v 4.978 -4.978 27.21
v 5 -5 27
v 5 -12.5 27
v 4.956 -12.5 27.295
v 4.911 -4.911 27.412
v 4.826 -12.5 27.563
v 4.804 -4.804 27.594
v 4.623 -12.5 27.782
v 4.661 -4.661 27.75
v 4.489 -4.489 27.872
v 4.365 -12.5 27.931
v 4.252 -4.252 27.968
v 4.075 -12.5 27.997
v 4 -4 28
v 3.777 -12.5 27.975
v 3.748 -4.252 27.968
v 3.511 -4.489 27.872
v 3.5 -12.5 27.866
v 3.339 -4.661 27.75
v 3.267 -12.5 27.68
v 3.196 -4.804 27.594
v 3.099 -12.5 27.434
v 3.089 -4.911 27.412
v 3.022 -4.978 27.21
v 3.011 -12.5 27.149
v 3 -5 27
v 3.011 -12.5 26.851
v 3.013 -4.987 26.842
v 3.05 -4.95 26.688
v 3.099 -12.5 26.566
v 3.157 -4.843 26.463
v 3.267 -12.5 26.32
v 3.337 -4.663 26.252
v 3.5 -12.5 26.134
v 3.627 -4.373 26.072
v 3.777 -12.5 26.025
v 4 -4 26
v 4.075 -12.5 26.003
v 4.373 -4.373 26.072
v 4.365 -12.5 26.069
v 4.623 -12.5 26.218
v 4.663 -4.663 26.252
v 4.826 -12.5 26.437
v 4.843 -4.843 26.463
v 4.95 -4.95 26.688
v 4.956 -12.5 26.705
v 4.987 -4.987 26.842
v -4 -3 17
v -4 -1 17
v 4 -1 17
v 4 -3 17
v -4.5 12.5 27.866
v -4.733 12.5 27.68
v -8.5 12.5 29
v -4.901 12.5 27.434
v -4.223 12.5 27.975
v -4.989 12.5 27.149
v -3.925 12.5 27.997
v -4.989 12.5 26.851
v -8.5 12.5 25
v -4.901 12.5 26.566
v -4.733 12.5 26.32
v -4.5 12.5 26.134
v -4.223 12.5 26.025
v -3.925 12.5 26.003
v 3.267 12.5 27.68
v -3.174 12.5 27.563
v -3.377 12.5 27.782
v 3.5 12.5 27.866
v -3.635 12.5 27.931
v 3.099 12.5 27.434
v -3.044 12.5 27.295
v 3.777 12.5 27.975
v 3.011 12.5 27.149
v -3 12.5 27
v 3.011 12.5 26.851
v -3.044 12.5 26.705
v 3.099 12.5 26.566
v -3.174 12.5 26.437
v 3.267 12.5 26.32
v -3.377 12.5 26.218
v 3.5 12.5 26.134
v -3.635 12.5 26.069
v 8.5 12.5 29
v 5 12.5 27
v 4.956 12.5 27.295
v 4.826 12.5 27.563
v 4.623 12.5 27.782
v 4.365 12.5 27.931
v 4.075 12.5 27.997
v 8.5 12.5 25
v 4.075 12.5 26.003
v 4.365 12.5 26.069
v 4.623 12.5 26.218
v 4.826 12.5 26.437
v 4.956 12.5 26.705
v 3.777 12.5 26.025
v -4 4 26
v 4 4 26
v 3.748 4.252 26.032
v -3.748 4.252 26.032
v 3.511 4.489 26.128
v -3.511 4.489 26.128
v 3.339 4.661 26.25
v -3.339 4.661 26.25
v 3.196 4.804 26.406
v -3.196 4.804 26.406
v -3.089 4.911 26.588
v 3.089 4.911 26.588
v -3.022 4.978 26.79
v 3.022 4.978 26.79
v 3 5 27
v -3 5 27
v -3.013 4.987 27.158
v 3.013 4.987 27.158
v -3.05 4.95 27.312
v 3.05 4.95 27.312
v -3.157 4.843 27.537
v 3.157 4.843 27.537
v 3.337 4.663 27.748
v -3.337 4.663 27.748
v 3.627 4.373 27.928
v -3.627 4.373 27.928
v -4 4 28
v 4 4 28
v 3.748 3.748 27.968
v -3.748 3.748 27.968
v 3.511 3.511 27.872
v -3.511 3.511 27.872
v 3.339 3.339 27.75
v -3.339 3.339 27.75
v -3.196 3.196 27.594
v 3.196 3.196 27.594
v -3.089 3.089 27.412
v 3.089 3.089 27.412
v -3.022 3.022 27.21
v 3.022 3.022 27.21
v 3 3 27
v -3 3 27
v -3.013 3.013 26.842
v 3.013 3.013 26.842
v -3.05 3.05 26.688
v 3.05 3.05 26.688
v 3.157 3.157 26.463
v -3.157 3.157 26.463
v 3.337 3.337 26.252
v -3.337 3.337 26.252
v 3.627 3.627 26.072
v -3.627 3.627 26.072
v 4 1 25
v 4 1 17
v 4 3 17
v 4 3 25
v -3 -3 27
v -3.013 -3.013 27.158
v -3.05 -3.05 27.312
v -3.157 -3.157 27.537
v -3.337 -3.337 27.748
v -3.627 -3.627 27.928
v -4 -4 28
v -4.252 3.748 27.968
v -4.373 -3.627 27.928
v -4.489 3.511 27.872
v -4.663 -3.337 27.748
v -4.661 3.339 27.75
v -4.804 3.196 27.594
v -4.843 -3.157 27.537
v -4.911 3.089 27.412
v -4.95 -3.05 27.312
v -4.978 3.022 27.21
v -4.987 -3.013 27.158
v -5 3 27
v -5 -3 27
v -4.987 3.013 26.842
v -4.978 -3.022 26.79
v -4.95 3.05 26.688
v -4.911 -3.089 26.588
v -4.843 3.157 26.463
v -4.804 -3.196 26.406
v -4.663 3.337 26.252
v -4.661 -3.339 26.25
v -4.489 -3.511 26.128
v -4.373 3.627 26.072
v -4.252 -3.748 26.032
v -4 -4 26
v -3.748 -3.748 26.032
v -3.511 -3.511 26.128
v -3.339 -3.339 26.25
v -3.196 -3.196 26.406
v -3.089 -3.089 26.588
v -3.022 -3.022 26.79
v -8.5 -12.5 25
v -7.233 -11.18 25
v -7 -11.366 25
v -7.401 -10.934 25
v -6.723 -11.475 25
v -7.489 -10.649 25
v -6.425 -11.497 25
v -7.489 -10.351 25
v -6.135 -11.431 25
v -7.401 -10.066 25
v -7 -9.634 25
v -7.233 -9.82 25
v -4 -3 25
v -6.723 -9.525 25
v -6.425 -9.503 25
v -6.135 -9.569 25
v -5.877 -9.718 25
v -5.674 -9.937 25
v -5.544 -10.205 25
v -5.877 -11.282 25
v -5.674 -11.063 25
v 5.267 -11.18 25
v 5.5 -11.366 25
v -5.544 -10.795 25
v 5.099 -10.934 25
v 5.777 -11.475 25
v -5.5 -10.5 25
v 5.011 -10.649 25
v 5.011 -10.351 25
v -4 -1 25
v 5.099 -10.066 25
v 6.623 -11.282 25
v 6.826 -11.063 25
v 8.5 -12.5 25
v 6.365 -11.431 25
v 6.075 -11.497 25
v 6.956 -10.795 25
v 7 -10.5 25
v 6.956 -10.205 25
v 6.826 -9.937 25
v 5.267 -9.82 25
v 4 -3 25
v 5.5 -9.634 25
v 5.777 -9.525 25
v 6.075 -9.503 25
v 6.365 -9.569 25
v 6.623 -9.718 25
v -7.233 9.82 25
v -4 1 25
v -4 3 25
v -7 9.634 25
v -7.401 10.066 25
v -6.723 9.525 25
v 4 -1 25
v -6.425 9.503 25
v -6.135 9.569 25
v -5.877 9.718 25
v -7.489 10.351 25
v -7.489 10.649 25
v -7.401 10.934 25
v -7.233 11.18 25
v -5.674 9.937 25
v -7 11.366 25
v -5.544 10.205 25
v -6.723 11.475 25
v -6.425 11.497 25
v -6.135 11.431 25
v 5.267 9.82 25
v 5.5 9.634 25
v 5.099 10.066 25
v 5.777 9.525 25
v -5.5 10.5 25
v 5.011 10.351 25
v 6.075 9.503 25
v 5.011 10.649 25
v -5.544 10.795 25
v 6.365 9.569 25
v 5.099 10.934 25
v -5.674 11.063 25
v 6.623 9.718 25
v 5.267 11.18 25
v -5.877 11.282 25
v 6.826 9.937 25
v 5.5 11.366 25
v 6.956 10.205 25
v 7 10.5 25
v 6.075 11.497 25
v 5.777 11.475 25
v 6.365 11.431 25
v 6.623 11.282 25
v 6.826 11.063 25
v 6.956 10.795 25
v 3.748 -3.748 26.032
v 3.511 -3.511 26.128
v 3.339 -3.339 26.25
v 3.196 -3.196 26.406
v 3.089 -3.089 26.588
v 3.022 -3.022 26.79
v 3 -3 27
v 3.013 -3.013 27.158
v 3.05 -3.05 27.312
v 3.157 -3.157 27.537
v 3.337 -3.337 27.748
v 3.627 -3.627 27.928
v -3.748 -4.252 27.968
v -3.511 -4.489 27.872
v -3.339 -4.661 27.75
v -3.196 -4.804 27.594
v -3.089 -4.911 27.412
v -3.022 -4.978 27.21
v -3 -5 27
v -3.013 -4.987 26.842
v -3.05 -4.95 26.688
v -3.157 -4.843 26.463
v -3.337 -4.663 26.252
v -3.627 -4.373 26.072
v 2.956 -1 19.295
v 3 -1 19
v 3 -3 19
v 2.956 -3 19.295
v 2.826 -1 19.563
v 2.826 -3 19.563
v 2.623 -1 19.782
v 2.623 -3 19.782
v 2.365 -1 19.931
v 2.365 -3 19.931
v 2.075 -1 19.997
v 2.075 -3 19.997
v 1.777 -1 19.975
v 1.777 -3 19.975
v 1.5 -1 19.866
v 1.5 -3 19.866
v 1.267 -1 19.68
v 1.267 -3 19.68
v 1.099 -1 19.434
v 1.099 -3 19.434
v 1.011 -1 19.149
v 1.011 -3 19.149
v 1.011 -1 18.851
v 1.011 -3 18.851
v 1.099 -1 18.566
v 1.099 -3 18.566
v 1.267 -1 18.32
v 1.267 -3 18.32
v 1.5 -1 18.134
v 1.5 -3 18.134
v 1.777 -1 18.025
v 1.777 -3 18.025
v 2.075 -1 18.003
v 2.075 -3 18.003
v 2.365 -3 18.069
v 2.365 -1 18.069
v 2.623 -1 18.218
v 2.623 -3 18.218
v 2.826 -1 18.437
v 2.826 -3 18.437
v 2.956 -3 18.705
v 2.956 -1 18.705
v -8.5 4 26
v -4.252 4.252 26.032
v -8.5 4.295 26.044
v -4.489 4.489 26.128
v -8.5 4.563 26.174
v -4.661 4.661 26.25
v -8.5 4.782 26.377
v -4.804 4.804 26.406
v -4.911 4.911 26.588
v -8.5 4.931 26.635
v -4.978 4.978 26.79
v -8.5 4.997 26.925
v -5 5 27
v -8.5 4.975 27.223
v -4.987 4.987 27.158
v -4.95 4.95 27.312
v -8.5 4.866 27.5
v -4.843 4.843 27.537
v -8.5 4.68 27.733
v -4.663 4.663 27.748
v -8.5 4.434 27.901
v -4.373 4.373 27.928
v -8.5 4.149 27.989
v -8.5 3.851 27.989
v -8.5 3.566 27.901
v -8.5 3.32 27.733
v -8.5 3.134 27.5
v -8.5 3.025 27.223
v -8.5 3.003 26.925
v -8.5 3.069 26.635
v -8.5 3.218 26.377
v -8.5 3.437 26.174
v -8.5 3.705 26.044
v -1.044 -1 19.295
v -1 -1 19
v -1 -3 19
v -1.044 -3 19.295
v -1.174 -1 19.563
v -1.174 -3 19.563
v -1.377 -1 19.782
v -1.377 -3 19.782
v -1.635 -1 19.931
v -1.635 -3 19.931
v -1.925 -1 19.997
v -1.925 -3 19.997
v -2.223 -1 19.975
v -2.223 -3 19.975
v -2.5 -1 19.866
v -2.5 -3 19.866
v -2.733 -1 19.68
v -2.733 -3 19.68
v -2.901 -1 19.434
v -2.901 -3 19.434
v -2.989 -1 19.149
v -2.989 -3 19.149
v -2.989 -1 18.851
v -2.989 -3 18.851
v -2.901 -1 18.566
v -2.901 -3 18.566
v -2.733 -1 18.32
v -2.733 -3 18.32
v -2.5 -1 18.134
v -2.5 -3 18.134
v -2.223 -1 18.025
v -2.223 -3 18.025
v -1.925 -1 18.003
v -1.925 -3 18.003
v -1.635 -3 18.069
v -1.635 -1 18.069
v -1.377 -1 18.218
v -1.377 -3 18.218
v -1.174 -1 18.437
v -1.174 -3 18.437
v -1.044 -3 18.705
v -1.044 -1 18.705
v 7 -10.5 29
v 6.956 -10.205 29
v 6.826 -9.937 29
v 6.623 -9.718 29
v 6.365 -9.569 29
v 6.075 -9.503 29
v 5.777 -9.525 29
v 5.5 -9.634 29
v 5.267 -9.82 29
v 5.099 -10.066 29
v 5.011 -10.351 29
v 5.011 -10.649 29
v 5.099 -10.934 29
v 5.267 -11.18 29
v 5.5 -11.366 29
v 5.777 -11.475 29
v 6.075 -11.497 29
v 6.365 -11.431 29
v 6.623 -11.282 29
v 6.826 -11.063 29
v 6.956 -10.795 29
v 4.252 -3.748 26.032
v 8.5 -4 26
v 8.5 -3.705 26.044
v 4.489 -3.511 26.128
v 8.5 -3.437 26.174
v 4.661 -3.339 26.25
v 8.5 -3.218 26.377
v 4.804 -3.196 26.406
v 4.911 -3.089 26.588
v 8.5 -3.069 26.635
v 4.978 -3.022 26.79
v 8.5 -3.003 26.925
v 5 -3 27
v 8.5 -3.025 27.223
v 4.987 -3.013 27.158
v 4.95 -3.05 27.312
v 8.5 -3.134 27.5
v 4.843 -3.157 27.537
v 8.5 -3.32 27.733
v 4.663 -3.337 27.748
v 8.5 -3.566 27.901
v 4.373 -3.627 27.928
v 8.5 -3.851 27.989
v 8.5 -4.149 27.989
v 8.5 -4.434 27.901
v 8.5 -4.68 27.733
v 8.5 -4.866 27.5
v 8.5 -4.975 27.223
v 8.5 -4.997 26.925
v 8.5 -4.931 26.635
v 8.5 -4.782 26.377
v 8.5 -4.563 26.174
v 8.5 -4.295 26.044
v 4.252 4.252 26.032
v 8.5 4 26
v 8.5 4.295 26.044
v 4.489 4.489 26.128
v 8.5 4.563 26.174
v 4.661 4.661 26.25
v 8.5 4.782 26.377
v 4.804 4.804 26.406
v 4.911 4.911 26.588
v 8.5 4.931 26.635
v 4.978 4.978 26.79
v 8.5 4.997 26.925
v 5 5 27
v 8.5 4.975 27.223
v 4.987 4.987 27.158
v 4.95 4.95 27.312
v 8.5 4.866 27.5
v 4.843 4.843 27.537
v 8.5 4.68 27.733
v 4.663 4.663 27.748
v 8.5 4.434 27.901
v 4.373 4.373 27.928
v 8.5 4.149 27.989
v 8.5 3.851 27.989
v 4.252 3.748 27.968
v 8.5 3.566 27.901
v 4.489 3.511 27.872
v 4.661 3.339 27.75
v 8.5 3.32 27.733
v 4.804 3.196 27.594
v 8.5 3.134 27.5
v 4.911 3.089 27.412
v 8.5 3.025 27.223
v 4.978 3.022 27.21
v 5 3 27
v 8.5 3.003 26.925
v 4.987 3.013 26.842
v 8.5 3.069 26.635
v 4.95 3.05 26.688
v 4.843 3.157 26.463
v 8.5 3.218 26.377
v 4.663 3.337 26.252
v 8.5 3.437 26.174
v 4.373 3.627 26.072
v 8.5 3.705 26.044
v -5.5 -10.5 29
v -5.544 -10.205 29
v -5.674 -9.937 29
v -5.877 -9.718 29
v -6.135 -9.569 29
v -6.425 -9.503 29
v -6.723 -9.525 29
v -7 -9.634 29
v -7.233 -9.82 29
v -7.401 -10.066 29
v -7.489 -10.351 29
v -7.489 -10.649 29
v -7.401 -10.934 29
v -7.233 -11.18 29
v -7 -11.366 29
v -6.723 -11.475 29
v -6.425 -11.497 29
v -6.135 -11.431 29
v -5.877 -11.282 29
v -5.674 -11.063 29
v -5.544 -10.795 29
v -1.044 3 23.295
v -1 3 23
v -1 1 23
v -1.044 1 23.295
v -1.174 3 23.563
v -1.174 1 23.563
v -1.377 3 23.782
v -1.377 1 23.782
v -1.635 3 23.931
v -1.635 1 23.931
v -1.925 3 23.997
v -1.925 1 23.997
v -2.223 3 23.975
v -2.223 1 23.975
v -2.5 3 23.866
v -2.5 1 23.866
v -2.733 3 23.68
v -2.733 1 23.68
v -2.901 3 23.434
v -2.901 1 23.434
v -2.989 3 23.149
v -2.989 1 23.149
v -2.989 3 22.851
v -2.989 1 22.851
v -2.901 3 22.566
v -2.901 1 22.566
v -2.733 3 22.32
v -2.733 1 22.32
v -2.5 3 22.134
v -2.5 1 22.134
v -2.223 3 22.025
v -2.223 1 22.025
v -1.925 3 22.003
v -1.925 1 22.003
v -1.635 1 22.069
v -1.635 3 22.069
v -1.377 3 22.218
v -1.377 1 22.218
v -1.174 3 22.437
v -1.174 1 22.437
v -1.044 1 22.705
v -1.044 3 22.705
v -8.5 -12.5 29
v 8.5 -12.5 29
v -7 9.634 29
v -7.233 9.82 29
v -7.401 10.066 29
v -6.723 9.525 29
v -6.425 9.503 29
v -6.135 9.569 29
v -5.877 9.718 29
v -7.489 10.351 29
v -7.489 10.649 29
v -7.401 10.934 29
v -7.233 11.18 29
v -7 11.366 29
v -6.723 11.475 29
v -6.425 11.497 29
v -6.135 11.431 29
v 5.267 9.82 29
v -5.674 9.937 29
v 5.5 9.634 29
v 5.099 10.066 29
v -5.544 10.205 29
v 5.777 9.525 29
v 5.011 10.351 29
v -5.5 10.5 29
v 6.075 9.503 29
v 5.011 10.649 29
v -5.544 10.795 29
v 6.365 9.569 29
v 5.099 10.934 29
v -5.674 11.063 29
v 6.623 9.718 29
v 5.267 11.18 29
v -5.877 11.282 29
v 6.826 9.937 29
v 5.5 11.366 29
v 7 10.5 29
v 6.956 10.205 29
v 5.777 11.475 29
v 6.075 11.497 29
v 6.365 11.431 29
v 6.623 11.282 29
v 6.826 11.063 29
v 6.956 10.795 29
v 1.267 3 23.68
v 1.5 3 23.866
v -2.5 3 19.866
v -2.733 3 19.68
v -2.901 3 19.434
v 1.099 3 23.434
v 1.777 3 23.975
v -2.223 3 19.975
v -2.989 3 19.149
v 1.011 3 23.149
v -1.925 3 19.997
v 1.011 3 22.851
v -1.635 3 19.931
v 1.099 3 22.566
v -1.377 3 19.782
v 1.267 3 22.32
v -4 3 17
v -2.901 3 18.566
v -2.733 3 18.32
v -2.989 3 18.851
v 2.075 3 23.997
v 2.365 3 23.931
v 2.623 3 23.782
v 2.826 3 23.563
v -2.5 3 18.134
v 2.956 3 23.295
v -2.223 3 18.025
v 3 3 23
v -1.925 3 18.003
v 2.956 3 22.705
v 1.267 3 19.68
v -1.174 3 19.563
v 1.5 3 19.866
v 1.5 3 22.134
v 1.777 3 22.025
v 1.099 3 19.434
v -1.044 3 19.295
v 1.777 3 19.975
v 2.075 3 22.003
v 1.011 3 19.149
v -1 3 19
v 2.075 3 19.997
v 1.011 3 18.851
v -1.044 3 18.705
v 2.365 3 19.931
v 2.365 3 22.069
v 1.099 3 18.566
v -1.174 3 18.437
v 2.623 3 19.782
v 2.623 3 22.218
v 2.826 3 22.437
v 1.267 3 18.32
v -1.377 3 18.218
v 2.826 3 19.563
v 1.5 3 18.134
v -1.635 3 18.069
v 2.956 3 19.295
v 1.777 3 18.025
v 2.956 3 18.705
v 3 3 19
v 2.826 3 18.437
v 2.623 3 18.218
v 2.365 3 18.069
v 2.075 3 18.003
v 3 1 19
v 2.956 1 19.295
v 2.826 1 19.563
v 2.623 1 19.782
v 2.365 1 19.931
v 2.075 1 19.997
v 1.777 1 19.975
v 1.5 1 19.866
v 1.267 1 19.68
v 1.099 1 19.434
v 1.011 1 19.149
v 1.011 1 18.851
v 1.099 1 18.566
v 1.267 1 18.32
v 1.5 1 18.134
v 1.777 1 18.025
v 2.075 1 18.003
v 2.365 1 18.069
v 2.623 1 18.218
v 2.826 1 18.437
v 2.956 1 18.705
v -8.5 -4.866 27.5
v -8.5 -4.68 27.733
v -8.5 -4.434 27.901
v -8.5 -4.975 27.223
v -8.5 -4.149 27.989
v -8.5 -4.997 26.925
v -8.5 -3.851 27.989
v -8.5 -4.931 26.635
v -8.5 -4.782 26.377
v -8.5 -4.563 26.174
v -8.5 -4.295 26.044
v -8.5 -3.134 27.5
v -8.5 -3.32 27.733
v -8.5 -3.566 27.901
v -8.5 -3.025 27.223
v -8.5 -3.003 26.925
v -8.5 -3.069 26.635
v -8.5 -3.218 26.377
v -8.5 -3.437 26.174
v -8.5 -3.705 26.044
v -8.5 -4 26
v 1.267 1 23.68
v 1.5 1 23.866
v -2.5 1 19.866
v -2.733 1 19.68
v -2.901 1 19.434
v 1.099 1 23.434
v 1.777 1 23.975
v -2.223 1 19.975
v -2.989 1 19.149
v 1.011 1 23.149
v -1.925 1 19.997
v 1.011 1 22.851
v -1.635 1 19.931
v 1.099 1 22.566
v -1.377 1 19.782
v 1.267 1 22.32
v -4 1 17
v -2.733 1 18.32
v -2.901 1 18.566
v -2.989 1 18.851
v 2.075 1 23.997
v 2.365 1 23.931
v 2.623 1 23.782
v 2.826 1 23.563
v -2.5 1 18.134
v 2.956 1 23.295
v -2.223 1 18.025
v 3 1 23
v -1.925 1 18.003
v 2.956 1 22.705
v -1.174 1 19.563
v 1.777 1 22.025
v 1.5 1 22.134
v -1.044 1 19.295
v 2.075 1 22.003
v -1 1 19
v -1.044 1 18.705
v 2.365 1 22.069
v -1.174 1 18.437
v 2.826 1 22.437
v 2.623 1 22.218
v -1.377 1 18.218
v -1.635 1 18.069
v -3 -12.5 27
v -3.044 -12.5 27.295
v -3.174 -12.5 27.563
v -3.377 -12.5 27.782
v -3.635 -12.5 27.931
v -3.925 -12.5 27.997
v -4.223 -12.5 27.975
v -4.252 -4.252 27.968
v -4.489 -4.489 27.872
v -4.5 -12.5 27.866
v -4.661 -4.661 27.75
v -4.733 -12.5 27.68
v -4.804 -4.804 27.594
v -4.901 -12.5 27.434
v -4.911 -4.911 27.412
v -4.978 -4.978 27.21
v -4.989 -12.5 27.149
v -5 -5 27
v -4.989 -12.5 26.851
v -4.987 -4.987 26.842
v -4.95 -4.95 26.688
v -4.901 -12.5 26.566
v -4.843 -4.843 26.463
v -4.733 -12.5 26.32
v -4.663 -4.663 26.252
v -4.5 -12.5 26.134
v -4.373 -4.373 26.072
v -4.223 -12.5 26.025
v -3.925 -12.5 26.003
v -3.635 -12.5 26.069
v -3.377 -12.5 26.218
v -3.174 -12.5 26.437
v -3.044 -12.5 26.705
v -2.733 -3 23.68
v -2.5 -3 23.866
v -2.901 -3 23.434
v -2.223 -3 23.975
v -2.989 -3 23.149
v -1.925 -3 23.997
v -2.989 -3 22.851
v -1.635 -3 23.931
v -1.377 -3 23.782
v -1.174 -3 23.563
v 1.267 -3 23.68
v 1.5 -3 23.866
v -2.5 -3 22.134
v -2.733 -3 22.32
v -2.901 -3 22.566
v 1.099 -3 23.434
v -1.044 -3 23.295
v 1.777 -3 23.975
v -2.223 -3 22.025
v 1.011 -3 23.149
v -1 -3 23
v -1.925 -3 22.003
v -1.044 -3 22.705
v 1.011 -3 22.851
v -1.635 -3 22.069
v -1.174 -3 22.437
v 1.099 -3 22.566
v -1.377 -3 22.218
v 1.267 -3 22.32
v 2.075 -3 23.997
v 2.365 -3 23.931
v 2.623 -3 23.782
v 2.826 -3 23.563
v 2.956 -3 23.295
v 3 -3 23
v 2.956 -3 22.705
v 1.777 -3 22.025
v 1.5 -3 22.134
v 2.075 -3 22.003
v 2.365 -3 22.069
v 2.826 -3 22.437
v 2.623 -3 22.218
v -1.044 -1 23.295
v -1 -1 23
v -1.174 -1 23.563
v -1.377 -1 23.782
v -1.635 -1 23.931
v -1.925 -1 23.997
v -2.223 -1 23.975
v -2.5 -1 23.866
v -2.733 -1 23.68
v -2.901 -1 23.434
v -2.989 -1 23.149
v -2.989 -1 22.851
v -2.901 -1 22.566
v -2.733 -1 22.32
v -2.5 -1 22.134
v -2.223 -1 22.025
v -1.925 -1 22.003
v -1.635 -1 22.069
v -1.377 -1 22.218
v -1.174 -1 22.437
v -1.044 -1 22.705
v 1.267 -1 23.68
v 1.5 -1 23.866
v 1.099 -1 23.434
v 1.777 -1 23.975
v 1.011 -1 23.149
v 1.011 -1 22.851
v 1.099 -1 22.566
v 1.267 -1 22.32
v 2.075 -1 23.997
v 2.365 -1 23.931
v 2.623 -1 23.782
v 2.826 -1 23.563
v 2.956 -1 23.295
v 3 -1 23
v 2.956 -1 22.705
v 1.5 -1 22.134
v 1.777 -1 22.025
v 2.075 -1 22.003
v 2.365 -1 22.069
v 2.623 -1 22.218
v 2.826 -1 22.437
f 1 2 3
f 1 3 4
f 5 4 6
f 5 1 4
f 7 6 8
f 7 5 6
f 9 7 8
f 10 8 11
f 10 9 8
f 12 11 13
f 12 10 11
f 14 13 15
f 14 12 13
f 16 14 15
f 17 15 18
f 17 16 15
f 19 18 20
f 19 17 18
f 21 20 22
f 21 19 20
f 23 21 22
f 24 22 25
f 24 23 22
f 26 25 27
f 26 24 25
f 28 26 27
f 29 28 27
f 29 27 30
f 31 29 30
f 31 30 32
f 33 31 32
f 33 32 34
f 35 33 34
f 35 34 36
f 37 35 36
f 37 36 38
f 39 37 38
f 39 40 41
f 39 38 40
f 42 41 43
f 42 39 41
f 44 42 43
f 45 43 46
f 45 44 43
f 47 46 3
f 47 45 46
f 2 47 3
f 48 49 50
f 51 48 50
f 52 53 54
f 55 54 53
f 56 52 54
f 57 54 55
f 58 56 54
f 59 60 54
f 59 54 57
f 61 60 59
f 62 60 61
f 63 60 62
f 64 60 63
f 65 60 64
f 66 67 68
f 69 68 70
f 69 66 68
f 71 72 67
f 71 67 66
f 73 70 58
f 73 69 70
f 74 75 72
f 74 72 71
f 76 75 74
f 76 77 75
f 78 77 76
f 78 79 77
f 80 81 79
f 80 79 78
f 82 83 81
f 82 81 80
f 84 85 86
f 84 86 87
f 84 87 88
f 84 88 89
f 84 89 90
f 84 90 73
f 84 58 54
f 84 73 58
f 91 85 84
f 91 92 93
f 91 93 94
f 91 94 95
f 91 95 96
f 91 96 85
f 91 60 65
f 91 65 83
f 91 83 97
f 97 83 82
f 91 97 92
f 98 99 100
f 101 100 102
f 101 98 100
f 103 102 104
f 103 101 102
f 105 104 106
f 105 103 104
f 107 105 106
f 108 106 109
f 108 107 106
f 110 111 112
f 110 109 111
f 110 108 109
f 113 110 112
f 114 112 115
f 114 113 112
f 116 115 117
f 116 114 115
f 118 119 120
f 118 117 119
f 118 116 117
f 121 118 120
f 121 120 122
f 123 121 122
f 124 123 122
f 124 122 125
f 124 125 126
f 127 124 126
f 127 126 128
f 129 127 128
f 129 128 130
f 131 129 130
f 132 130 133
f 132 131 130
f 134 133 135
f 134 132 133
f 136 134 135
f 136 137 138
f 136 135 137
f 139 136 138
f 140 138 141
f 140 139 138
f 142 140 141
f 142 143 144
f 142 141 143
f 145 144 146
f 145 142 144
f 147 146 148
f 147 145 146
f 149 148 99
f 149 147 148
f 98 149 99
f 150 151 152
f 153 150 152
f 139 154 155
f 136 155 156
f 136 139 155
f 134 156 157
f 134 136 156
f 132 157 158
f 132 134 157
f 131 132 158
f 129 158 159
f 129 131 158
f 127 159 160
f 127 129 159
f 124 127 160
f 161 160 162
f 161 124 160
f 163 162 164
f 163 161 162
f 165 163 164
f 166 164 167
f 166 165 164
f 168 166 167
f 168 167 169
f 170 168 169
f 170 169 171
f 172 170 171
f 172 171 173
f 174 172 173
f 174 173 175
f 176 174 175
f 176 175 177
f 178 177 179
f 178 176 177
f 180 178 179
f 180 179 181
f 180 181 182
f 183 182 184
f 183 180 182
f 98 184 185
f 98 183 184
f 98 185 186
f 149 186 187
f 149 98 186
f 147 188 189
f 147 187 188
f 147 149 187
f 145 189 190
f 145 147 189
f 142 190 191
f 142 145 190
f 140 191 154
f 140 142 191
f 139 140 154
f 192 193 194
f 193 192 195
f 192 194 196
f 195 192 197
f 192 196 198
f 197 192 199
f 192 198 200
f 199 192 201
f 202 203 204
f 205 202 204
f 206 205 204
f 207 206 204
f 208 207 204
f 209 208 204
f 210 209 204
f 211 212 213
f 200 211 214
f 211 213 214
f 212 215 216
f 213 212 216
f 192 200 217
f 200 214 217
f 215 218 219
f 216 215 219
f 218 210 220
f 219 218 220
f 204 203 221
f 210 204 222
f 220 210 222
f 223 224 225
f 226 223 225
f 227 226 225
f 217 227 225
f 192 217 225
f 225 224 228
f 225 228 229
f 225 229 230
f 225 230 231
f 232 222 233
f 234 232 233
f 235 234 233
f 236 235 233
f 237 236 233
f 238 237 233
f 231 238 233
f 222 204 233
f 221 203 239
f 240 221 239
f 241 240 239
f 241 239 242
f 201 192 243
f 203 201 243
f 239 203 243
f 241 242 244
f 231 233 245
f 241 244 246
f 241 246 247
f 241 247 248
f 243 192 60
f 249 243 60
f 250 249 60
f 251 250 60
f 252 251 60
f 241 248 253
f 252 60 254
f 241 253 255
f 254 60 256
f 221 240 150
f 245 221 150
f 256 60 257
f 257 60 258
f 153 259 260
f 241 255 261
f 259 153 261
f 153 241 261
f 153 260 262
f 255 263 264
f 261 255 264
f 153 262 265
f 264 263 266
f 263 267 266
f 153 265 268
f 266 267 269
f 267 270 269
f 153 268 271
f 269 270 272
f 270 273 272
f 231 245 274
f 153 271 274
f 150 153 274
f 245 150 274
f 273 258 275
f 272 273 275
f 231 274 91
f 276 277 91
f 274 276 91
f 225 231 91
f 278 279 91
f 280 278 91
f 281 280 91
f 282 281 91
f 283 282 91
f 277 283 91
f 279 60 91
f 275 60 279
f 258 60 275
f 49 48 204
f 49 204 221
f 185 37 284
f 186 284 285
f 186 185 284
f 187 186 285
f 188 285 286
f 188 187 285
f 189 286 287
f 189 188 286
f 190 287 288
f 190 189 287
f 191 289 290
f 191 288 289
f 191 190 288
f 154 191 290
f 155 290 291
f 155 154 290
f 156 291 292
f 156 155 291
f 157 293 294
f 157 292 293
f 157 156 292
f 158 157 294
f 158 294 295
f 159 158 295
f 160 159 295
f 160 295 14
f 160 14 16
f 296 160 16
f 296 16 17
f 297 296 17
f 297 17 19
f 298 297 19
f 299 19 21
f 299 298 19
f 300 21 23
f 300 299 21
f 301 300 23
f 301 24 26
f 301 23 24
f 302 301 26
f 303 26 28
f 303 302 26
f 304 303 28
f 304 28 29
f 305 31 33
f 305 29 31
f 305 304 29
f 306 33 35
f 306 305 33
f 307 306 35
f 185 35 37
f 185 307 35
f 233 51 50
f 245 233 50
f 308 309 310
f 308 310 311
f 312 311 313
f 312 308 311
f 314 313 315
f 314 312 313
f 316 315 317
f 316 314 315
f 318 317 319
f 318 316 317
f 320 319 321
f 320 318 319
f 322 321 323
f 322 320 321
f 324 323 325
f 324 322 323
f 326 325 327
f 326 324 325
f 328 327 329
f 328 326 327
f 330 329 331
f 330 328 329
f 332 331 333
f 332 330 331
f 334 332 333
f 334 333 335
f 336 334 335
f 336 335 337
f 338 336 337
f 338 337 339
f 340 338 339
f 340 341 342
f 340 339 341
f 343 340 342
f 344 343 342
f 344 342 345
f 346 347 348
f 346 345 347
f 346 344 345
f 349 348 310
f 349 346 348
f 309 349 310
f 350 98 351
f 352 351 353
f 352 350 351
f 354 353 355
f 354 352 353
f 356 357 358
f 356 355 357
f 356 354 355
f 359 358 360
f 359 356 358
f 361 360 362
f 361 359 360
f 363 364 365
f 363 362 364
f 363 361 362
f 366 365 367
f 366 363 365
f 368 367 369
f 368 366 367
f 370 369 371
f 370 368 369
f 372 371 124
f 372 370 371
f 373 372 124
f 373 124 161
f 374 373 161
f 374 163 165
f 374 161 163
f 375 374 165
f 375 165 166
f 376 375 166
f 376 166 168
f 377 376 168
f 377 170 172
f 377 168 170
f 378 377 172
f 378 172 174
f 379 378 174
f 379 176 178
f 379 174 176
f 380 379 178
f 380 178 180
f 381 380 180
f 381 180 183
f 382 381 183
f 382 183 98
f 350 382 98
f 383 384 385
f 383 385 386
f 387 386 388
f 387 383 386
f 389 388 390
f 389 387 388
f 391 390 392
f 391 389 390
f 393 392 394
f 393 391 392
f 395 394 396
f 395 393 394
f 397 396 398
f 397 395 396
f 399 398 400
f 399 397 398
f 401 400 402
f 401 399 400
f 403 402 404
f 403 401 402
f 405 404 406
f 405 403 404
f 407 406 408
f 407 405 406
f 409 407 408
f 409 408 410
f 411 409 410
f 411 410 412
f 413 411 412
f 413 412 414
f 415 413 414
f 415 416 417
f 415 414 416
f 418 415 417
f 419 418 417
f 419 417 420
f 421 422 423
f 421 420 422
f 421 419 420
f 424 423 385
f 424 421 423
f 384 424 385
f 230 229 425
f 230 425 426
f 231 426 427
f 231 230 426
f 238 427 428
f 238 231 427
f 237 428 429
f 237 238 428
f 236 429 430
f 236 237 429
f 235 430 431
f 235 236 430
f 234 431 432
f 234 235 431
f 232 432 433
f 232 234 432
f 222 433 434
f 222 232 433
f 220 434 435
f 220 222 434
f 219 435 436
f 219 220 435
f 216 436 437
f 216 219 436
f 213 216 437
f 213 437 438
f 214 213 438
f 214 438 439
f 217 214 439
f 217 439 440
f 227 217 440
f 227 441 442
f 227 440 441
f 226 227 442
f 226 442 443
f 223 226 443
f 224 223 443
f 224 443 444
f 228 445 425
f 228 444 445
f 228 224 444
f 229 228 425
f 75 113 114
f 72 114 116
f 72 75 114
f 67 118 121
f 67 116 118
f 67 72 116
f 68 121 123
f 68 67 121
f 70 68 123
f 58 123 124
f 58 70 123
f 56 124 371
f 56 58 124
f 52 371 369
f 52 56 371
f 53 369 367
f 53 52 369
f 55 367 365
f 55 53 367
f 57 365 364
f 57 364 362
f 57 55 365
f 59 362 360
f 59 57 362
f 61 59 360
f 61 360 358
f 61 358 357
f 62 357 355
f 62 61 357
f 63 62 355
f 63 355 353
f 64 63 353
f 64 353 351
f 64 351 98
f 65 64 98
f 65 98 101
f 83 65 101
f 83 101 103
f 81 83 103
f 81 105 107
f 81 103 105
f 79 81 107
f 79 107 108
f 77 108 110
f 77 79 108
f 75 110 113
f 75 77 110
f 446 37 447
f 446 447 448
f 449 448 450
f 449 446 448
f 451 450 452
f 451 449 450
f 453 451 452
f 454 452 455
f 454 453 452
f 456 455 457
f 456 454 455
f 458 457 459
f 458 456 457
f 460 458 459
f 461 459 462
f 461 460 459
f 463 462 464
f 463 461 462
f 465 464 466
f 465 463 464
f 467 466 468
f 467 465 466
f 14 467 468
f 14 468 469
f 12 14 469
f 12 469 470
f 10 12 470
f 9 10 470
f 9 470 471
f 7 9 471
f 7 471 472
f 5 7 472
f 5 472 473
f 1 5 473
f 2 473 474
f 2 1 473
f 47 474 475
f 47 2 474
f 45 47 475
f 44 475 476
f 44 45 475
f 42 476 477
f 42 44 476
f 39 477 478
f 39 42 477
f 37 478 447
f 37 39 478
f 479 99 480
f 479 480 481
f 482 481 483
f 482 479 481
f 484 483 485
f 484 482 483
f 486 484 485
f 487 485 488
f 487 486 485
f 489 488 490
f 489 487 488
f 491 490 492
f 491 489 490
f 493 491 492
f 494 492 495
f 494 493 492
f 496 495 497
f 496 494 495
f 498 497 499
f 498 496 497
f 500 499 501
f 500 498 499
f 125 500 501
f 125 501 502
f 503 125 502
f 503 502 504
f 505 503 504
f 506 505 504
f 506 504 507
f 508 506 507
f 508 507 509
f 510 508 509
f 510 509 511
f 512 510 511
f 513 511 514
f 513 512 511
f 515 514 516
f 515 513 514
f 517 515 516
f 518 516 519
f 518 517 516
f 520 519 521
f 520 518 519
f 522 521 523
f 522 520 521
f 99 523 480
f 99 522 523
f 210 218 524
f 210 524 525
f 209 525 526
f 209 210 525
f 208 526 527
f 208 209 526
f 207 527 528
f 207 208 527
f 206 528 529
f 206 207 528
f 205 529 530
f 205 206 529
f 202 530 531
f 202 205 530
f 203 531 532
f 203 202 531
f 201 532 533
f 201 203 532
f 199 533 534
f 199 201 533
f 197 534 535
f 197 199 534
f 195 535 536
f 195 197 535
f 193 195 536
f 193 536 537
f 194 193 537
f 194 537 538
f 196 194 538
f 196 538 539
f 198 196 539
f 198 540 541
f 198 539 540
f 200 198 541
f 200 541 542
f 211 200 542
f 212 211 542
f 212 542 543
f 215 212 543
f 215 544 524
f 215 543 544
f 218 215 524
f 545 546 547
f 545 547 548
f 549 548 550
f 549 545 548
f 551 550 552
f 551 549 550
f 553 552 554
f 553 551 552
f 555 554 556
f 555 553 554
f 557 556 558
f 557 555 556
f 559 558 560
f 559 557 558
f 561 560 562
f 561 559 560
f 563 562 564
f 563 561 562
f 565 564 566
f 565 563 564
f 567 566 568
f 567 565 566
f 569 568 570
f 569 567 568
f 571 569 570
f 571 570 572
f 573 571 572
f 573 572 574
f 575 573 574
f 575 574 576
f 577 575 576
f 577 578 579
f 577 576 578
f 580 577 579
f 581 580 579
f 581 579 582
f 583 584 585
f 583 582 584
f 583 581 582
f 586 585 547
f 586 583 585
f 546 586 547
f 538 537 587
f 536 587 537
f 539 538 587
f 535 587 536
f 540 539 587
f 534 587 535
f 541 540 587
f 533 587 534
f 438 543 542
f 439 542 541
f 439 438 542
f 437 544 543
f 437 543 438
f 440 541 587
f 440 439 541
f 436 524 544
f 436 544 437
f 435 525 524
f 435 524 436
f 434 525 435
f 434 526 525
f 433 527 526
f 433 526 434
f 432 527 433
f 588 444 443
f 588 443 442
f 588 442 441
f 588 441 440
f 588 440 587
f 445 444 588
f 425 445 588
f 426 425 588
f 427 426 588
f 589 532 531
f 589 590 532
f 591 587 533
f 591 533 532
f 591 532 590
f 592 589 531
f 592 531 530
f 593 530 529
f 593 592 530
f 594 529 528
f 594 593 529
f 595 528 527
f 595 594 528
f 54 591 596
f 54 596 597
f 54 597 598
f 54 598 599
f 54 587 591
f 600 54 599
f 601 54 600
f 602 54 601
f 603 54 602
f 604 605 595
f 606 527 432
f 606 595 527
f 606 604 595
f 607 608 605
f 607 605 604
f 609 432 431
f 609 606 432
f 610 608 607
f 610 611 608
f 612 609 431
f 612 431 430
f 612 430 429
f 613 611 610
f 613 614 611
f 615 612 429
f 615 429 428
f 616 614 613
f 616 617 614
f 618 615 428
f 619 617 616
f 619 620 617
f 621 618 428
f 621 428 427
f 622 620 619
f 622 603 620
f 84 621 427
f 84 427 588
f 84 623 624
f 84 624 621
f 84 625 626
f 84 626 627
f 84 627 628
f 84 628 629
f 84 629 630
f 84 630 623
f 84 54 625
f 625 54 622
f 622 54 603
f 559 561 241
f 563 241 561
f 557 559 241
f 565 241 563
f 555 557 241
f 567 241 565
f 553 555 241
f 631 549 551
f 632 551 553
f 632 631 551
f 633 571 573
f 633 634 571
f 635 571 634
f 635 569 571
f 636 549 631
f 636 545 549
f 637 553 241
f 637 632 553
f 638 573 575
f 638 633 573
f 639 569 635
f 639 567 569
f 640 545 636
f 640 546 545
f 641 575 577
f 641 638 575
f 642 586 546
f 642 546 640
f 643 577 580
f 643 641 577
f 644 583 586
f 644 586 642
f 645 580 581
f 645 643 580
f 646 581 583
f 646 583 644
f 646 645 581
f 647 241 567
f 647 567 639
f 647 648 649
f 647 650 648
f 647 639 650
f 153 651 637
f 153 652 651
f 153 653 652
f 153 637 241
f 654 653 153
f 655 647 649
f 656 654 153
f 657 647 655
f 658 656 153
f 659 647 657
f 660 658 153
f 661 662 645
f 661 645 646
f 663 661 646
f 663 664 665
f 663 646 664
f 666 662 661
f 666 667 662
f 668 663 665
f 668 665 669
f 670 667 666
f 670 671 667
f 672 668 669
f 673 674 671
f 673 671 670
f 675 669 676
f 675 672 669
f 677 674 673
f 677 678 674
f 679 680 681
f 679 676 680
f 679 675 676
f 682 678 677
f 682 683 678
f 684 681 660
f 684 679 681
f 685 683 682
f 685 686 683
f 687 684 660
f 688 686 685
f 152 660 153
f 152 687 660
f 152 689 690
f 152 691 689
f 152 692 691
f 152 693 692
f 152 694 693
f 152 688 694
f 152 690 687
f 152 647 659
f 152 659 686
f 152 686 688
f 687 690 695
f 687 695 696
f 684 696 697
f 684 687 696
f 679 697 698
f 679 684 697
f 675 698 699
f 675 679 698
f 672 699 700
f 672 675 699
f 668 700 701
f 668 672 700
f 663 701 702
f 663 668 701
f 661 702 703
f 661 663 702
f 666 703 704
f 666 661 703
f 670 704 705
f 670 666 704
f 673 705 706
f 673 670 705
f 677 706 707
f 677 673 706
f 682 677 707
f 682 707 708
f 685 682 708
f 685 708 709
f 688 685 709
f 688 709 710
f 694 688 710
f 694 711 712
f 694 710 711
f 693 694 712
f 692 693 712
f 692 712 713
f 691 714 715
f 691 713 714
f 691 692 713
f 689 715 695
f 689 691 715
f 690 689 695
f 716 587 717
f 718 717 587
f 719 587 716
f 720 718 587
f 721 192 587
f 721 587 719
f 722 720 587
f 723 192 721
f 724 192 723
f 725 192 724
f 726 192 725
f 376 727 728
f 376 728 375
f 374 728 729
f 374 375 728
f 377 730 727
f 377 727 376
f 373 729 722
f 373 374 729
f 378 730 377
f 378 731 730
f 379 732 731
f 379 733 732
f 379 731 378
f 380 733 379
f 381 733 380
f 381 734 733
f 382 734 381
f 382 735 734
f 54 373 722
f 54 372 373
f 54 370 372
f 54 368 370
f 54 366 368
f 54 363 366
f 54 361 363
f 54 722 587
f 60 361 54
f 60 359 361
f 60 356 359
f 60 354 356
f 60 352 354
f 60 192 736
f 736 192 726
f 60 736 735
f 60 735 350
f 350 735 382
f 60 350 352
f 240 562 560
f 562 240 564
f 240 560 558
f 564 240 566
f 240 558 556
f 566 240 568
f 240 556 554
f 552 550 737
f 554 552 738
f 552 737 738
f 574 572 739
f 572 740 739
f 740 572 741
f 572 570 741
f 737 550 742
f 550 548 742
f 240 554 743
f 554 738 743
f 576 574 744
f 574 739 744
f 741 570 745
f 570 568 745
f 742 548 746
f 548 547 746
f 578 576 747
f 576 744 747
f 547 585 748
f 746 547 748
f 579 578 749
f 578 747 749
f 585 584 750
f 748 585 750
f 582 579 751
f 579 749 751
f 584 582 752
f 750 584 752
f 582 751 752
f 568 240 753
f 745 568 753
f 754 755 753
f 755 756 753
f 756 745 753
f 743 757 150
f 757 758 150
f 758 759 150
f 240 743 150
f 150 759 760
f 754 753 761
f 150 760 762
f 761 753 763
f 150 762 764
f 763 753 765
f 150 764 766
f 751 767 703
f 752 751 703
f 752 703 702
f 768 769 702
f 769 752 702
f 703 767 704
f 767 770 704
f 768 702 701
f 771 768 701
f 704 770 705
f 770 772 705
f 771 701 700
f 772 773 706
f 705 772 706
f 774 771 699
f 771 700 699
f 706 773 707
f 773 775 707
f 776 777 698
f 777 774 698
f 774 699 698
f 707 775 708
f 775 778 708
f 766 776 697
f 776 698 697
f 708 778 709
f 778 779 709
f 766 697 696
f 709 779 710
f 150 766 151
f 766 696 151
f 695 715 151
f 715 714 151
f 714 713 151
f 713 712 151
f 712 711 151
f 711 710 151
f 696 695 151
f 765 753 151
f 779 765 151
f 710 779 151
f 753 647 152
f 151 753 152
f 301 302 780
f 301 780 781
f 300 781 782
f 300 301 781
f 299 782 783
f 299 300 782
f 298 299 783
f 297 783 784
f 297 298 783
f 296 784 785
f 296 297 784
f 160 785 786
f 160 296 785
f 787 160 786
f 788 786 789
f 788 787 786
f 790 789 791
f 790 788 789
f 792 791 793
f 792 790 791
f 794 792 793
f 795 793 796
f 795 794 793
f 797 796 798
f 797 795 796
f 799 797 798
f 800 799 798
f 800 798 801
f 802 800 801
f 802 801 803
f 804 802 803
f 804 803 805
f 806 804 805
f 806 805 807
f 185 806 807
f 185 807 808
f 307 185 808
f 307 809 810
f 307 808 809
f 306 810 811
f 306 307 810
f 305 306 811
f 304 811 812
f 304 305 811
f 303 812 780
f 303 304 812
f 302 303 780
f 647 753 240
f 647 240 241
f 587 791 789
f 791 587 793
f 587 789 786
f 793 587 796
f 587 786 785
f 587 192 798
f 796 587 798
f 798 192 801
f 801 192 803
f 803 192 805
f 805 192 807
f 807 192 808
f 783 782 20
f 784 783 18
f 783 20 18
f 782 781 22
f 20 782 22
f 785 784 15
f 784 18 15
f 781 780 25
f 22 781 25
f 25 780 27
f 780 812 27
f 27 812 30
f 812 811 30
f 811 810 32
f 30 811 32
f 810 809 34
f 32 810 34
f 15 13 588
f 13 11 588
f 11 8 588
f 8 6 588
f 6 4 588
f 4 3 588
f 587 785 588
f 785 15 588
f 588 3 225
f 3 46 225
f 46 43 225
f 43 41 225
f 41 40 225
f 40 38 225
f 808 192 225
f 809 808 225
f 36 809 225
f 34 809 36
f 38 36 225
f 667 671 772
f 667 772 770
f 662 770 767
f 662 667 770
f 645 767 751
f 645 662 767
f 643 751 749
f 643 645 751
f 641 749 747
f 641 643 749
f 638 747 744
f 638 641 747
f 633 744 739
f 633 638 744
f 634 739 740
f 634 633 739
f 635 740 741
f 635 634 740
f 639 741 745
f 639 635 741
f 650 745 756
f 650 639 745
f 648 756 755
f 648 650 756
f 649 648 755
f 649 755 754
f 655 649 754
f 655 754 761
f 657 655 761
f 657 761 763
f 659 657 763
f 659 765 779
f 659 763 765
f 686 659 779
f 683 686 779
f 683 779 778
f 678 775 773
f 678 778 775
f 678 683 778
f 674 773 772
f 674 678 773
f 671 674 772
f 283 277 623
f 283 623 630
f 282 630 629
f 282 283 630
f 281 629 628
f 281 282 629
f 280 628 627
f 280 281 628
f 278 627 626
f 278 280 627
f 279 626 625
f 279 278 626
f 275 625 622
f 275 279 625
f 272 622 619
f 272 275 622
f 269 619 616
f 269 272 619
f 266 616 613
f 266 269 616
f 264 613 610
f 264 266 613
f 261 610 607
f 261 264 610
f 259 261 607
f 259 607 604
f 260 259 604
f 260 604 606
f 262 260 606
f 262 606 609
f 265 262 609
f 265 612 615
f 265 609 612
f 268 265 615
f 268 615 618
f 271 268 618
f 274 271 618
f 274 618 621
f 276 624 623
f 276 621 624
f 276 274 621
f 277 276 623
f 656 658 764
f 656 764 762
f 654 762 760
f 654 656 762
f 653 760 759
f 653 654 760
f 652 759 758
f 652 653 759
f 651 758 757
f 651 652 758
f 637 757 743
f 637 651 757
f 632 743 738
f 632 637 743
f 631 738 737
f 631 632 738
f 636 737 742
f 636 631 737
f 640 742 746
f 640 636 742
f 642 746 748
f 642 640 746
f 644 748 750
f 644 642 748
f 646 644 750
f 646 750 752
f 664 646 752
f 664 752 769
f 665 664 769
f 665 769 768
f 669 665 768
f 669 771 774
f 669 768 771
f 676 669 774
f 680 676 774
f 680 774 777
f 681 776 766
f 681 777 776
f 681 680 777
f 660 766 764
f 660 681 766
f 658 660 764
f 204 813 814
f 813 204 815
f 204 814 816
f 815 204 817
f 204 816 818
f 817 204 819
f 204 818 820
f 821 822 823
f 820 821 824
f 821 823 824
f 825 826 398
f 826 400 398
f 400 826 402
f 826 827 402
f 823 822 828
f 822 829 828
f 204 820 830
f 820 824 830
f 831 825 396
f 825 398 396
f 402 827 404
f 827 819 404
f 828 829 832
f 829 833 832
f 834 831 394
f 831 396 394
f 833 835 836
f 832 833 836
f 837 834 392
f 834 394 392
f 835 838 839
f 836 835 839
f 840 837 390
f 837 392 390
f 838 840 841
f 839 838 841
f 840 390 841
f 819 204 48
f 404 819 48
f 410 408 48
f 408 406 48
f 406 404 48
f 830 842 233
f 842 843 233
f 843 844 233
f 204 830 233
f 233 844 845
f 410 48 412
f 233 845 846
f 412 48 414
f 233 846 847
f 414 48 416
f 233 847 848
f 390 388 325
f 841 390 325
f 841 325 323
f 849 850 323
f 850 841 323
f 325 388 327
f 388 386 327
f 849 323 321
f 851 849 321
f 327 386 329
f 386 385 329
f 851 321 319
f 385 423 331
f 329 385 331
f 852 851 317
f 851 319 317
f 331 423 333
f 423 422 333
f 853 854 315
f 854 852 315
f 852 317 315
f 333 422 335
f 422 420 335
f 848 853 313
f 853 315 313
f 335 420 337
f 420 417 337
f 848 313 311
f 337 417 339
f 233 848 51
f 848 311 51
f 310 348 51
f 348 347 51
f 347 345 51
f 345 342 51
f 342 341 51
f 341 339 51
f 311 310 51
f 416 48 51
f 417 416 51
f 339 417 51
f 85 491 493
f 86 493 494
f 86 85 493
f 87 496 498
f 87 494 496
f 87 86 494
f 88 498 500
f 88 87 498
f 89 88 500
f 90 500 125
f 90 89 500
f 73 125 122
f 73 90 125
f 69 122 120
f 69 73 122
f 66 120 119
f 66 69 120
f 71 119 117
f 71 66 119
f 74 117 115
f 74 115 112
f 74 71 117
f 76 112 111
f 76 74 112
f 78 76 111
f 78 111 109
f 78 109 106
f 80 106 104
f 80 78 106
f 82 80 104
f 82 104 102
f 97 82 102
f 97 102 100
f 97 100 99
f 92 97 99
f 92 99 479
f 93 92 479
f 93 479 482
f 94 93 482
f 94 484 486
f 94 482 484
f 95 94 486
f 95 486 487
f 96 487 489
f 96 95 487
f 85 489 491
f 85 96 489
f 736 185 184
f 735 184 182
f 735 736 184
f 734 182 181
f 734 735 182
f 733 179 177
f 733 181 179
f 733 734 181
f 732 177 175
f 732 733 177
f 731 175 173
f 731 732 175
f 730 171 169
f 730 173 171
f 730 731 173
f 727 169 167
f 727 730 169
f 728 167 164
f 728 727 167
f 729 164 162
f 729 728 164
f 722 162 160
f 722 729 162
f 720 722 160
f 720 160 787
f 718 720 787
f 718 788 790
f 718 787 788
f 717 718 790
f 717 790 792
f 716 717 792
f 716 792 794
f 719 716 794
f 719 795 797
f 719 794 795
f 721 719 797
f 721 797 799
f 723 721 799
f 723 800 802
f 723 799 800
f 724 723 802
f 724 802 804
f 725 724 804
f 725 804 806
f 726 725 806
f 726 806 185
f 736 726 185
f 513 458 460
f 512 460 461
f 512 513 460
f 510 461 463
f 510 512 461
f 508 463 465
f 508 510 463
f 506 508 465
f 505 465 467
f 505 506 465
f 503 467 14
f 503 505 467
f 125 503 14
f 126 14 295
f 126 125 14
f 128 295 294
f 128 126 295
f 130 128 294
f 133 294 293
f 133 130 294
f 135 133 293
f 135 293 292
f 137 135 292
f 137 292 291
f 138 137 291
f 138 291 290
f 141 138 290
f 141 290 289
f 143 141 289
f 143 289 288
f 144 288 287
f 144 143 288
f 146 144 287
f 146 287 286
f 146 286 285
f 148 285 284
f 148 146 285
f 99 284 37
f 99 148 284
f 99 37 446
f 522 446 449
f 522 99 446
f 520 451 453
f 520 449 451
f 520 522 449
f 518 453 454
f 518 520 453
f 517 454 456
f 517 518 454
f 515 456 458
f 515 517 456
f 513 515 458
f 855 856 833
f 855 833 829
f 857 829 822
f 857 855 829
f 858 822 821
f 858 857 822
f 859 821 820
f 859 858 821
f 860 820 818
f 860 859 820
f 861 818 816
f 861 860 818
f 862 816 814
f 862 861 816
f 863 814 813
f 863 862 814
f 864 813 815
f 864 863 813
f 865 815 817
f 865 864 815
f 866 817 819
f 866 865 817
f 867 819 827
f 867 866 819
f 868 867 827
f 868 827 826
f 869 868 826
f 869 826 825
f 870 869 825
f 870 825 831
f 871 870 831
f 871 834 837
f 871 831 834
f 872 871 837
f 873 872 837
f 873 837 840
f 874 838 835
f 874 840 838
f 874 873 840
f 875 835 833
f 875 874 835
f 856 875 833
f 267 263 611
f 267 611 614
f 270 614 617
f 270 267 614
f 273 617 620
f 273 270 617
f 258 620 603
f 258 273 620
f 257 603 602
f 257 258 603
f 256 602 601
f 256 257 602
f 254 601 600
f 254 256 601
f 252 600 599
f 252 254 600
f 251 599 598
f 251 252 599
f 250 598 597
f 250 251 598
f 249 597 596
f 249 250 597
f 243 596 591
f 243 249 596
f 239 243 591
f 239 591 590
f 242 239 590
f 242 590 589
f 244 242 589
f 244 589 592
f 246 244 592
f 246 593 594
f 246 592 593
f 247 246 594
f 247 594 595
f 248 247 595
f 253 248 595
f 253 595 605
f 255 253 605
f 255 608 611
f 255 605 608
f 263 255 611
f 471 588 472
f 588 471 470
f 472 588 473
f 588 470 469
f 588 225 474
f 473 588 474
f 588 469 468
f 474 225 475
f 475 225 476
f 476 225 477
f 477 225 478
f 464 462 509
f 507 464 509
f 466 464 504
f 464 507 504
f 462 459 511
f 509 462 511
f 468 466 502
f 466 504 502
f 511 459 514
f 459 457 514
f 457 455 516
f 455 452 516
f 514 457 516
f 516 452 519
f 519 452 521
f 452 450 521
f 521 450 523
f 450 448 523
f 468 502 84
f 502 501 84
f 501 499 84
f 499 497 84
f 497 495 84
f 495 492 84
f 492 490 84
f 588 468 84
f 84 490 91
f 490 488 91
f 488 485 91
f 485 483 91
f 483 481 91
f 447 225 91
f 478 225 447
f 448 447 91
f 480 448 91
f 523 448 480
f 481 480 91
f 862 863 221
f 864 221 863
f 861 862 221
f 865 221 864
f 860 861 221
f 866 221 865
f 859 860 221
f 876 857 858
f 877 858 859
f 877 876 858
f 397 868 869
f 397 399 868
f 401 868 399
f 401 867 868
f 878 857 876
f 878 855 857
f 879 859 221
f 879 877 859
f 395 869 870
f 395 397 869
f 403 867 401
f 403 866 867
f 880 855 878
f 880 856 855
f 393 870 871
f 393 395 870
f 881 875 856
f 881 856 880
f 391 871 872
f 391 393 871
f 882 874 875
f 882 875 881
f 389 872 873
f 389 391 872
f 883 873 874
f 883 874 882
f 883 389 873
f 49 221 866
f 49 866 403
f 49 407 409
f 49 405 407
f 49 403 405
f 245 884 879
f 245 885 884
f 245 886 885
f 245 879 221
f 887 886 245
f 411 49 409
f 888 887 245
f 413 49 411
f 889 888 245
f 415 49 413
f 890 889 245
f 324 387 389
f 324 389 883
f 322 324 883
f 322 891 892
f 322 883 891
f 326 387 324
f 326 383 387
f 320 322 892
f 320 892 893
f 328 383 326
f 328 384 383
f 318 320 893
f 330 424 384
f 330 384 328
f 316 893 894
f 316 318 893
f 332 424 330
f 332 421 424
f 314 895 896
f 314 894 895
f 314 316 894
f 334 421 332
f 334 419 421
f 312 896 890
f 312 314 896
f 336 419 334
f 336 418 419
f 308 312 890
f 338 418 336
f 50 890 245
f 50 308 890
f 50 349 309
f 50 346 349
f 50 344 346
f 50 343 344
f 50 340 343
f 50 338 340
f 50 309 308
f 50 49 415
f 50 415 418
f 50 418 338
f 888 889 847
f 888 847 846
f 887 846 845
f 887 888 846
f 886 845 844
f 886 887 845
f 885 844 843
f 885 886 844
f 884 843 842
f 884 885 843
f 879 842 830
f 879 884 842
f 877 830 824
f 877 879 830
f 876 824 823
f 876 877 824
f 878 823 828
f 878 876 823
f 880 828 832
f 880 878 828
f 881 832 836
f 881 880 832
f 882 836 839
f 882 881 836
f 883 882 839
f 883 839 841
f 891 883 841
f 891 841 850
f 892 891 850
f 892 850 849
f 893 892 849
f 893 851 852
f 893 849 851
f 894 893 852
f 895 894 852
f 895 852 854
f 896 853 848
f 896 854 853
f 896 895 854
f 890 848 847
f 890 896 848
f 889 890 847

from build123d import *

# Parameters (mm, degrees)
CYLINDER021_R     = 1
CYLINDER021_DEPTH = 50
ARRAY024_X_COUNT  = 2
ARRAY024_X_PITCH  = 8
CYLINDER022_R     = 1
CYLINDER022_DEPTH = 50
ARRAY025_Y_COUNT  = 2
ARRAY025_Y_PITCH  = 8
CYLINDER020_R     = 1
CYLINDER020_DEPTH = 10
ARRAY023_X_COUNT  = 2
ARRAY023_X_PITCH  = 12.5
ARRAY023_Y_COUNT  = 2
ARRAY023_Y_PITCH  = 21
CYLINDER019_R     = 1
CYLINDER019_DEPTH = 10
ARRAY022_X_COUNT  = 2
ARRAY022_X_PITCH  = 4
ARRAY022_Z_COUNT  = 2
ARRAY022_Z_PITCH  = 4
BOX016_W          = 8
BOX016_H          = 2
BOX016_DEPTH      = 8
ARRAY021_Y_COUNT  = 2
ARRAY021_Y_PITCH  = 4
BOX015_W          = 17
BOX015_H          = 25
BOX015_DEPTH      = 4


with BuildPart() as cameramountexpansionscrewshorizontal:
    # Cylinder021 → Cylinder021 (new body)
    with BuildSketch(Plane(origin=(-4, 12.5, 27), x_dir=(1, 0, 0), z_dir=(0, -1, 0))):
        Circle(CYLINDER021_R)
    extrude(amount=CYLINDER021_DEPTH)

    # Array024 X: CameraMountExpansionScrewsHorizontal ×2


with BuildPart() as cameramountexpansionscrewshorizontal_1:
    add(cameramountexpansionscrewshorizontal.part)
    with Locations(*[(i * ARRAY024_X_PITCH, 0, 0) for i in range(1, ARRAY024_X_COUNT)]):
        add(cameramountexpansionscrewshorizontal.part)


with BuildPart() as cameraexpansionscrews:
    # Cylinder022 → Cylinder022 (new body)
    with BuildSketch(Plane(origin=(-25, -4, 27), x_dir=(0, 0, -1), z_dir=(1, 0, 0))):
        Circle(CYLINDER022_R)
    extrude(amount=CYLINDER022_DEPTH)

    # Array025 Y: CameraExpansionScrews ×2


with BuildPart() as cameraexpansionscrews_1:
    add(cameraexpansionscrews.part)
    with Locations(*[(0, i * ARRAY025_Y_PITCH, 0) for i in range(1, ARRAY025_Y_COUNT)]):
        add(cameraexpansionscrews.part)

    # Fusion010: union CameraMountExpansionScrewsHorizontal
    add(cameramountexpansionscrewshorizontal_1.part)


with BuildPart() as camerascrews:
    # Cylinder020 → Cylinder020 (new body)
    with BuildSketch(Plane(origin=(-6.5, -10.5, 21), x_dir=(1, 0, 0), z_dir=(0, 0, 1))):
        Circle(CYLINDER020_R)
    extrude(amount=CYLINDER020_DEPTH)

    # Array023 X: CameraScrews ×2


with BuildPart() as camerascrews_1:
    add(camerascrews.part)
    with Locations(*[(i * ARRAY023_X_PITCH, 0, 0) for i in range(1, ARRAY023_X_COUNT)]):
        add(camerascrews.part)

    # Array023 Y: CameraScrews ×2


with BuildPart() as camerascrews_2:
    add(camerascrews_1.part)
    with Locations(*[(0, i * ARRAY023_Y_PITCH, 0) for i in range(1, ARRAY023_Y_COUNT)]):
        add(camerascrews_1.part)


with BuildPart() as cameramountplaneconnectorscrews:
    # Cylinder019 → Cylinder019 (new body)
    with BuildSketch(Plane(origin=(2, 5, 19), x_dir=(1, 0, 0), z_dir=(0, -1, 0))):
        Circle(CYLINDER019_R)
    extrude(amount=CYLINDER019_DEPTH)

    # Array022 X: CameraMountPlaneConnectorScrews ×2


with BuildPart() as cameramountplaneconnectorscrews_1:
    add(cameramountplaneconnectorscrews.part)
    with Locations(*[(-i * ARRAY022_X_PITCH, 0, 0) for i in range(1, ARRAY022_X_COUNT)]):
        add(cameramountplaneconnectorscrews.part)

    # Array022 Z: CameraMountPlaneConnectorScrews ×2


with BuildPart() as cameramountplaneconnectorscrews_2:
    add(cameramountplaneconnectorscrews_1.part)
    with Locations(*[(0, 0, i * ARRAY022_Z_PITCH) for i in range(1, ARRAY022_Z_COUNT)]):
        add(cameramountplaneconnectorscrews_1.part)


with BuildPart() as cameramountplaneconnector:
    # Box016 → Box016 (new body)
    with BuildSketch(Plane(origin=(-4, 1, 17), x_dir=(1, 0, 0), z_dir=(0, 0, 1))):
        with Locations((4, 1)):
            Rectangle(BOX016_W, BOX016_H)
    extrude(amount=BOX016_DEPTH)

    # Cut042: cut CameraMountPlaneConnectorScrews
    add(cameramountplaneconnectorscrews_2.part, mode=Mode.SUBTRACT)

    # Array021 Y: CameraMountPlaneConnector ×2


with BuildPart() as cameramountplaneconnector_1:
    add(cameramountplaneconnector.part)
    with Locations(*[(0, -i * ARRAY021_Y_PITCH, 0) for i in range(1, ARRAY021_Y_COUNT)]):
        add(cameramountplaneconnector.part)


with BuildPart() as cameramountplane3:
    # Box015 → Box015 (new body)
    with BuildSketch(Plane(origin=(-8.5, -12.5, 25), x_dir=(1, 0, 0), z_dir=(0, 0, 1))):
        with Locations((8.5, 12.5)):
            Rectangle(BOX015_W, BOX015_H)
    extrude(amount=BOX015_DEPTH)

    # Fusion009: union CameraMountPlaneConnector
    add(cameramountplaneconnector_1.part)

    # Cut043: cut CameraScrews
    add(camerascrews_2.part, mode=Mode.SUBTRACT)

    # Cut044: cut CameraExpansionScrews
    add(cameraexpansionscrews_1.part, mode=Mode.SUBTRACT)


solid = cameramountplane3.part
